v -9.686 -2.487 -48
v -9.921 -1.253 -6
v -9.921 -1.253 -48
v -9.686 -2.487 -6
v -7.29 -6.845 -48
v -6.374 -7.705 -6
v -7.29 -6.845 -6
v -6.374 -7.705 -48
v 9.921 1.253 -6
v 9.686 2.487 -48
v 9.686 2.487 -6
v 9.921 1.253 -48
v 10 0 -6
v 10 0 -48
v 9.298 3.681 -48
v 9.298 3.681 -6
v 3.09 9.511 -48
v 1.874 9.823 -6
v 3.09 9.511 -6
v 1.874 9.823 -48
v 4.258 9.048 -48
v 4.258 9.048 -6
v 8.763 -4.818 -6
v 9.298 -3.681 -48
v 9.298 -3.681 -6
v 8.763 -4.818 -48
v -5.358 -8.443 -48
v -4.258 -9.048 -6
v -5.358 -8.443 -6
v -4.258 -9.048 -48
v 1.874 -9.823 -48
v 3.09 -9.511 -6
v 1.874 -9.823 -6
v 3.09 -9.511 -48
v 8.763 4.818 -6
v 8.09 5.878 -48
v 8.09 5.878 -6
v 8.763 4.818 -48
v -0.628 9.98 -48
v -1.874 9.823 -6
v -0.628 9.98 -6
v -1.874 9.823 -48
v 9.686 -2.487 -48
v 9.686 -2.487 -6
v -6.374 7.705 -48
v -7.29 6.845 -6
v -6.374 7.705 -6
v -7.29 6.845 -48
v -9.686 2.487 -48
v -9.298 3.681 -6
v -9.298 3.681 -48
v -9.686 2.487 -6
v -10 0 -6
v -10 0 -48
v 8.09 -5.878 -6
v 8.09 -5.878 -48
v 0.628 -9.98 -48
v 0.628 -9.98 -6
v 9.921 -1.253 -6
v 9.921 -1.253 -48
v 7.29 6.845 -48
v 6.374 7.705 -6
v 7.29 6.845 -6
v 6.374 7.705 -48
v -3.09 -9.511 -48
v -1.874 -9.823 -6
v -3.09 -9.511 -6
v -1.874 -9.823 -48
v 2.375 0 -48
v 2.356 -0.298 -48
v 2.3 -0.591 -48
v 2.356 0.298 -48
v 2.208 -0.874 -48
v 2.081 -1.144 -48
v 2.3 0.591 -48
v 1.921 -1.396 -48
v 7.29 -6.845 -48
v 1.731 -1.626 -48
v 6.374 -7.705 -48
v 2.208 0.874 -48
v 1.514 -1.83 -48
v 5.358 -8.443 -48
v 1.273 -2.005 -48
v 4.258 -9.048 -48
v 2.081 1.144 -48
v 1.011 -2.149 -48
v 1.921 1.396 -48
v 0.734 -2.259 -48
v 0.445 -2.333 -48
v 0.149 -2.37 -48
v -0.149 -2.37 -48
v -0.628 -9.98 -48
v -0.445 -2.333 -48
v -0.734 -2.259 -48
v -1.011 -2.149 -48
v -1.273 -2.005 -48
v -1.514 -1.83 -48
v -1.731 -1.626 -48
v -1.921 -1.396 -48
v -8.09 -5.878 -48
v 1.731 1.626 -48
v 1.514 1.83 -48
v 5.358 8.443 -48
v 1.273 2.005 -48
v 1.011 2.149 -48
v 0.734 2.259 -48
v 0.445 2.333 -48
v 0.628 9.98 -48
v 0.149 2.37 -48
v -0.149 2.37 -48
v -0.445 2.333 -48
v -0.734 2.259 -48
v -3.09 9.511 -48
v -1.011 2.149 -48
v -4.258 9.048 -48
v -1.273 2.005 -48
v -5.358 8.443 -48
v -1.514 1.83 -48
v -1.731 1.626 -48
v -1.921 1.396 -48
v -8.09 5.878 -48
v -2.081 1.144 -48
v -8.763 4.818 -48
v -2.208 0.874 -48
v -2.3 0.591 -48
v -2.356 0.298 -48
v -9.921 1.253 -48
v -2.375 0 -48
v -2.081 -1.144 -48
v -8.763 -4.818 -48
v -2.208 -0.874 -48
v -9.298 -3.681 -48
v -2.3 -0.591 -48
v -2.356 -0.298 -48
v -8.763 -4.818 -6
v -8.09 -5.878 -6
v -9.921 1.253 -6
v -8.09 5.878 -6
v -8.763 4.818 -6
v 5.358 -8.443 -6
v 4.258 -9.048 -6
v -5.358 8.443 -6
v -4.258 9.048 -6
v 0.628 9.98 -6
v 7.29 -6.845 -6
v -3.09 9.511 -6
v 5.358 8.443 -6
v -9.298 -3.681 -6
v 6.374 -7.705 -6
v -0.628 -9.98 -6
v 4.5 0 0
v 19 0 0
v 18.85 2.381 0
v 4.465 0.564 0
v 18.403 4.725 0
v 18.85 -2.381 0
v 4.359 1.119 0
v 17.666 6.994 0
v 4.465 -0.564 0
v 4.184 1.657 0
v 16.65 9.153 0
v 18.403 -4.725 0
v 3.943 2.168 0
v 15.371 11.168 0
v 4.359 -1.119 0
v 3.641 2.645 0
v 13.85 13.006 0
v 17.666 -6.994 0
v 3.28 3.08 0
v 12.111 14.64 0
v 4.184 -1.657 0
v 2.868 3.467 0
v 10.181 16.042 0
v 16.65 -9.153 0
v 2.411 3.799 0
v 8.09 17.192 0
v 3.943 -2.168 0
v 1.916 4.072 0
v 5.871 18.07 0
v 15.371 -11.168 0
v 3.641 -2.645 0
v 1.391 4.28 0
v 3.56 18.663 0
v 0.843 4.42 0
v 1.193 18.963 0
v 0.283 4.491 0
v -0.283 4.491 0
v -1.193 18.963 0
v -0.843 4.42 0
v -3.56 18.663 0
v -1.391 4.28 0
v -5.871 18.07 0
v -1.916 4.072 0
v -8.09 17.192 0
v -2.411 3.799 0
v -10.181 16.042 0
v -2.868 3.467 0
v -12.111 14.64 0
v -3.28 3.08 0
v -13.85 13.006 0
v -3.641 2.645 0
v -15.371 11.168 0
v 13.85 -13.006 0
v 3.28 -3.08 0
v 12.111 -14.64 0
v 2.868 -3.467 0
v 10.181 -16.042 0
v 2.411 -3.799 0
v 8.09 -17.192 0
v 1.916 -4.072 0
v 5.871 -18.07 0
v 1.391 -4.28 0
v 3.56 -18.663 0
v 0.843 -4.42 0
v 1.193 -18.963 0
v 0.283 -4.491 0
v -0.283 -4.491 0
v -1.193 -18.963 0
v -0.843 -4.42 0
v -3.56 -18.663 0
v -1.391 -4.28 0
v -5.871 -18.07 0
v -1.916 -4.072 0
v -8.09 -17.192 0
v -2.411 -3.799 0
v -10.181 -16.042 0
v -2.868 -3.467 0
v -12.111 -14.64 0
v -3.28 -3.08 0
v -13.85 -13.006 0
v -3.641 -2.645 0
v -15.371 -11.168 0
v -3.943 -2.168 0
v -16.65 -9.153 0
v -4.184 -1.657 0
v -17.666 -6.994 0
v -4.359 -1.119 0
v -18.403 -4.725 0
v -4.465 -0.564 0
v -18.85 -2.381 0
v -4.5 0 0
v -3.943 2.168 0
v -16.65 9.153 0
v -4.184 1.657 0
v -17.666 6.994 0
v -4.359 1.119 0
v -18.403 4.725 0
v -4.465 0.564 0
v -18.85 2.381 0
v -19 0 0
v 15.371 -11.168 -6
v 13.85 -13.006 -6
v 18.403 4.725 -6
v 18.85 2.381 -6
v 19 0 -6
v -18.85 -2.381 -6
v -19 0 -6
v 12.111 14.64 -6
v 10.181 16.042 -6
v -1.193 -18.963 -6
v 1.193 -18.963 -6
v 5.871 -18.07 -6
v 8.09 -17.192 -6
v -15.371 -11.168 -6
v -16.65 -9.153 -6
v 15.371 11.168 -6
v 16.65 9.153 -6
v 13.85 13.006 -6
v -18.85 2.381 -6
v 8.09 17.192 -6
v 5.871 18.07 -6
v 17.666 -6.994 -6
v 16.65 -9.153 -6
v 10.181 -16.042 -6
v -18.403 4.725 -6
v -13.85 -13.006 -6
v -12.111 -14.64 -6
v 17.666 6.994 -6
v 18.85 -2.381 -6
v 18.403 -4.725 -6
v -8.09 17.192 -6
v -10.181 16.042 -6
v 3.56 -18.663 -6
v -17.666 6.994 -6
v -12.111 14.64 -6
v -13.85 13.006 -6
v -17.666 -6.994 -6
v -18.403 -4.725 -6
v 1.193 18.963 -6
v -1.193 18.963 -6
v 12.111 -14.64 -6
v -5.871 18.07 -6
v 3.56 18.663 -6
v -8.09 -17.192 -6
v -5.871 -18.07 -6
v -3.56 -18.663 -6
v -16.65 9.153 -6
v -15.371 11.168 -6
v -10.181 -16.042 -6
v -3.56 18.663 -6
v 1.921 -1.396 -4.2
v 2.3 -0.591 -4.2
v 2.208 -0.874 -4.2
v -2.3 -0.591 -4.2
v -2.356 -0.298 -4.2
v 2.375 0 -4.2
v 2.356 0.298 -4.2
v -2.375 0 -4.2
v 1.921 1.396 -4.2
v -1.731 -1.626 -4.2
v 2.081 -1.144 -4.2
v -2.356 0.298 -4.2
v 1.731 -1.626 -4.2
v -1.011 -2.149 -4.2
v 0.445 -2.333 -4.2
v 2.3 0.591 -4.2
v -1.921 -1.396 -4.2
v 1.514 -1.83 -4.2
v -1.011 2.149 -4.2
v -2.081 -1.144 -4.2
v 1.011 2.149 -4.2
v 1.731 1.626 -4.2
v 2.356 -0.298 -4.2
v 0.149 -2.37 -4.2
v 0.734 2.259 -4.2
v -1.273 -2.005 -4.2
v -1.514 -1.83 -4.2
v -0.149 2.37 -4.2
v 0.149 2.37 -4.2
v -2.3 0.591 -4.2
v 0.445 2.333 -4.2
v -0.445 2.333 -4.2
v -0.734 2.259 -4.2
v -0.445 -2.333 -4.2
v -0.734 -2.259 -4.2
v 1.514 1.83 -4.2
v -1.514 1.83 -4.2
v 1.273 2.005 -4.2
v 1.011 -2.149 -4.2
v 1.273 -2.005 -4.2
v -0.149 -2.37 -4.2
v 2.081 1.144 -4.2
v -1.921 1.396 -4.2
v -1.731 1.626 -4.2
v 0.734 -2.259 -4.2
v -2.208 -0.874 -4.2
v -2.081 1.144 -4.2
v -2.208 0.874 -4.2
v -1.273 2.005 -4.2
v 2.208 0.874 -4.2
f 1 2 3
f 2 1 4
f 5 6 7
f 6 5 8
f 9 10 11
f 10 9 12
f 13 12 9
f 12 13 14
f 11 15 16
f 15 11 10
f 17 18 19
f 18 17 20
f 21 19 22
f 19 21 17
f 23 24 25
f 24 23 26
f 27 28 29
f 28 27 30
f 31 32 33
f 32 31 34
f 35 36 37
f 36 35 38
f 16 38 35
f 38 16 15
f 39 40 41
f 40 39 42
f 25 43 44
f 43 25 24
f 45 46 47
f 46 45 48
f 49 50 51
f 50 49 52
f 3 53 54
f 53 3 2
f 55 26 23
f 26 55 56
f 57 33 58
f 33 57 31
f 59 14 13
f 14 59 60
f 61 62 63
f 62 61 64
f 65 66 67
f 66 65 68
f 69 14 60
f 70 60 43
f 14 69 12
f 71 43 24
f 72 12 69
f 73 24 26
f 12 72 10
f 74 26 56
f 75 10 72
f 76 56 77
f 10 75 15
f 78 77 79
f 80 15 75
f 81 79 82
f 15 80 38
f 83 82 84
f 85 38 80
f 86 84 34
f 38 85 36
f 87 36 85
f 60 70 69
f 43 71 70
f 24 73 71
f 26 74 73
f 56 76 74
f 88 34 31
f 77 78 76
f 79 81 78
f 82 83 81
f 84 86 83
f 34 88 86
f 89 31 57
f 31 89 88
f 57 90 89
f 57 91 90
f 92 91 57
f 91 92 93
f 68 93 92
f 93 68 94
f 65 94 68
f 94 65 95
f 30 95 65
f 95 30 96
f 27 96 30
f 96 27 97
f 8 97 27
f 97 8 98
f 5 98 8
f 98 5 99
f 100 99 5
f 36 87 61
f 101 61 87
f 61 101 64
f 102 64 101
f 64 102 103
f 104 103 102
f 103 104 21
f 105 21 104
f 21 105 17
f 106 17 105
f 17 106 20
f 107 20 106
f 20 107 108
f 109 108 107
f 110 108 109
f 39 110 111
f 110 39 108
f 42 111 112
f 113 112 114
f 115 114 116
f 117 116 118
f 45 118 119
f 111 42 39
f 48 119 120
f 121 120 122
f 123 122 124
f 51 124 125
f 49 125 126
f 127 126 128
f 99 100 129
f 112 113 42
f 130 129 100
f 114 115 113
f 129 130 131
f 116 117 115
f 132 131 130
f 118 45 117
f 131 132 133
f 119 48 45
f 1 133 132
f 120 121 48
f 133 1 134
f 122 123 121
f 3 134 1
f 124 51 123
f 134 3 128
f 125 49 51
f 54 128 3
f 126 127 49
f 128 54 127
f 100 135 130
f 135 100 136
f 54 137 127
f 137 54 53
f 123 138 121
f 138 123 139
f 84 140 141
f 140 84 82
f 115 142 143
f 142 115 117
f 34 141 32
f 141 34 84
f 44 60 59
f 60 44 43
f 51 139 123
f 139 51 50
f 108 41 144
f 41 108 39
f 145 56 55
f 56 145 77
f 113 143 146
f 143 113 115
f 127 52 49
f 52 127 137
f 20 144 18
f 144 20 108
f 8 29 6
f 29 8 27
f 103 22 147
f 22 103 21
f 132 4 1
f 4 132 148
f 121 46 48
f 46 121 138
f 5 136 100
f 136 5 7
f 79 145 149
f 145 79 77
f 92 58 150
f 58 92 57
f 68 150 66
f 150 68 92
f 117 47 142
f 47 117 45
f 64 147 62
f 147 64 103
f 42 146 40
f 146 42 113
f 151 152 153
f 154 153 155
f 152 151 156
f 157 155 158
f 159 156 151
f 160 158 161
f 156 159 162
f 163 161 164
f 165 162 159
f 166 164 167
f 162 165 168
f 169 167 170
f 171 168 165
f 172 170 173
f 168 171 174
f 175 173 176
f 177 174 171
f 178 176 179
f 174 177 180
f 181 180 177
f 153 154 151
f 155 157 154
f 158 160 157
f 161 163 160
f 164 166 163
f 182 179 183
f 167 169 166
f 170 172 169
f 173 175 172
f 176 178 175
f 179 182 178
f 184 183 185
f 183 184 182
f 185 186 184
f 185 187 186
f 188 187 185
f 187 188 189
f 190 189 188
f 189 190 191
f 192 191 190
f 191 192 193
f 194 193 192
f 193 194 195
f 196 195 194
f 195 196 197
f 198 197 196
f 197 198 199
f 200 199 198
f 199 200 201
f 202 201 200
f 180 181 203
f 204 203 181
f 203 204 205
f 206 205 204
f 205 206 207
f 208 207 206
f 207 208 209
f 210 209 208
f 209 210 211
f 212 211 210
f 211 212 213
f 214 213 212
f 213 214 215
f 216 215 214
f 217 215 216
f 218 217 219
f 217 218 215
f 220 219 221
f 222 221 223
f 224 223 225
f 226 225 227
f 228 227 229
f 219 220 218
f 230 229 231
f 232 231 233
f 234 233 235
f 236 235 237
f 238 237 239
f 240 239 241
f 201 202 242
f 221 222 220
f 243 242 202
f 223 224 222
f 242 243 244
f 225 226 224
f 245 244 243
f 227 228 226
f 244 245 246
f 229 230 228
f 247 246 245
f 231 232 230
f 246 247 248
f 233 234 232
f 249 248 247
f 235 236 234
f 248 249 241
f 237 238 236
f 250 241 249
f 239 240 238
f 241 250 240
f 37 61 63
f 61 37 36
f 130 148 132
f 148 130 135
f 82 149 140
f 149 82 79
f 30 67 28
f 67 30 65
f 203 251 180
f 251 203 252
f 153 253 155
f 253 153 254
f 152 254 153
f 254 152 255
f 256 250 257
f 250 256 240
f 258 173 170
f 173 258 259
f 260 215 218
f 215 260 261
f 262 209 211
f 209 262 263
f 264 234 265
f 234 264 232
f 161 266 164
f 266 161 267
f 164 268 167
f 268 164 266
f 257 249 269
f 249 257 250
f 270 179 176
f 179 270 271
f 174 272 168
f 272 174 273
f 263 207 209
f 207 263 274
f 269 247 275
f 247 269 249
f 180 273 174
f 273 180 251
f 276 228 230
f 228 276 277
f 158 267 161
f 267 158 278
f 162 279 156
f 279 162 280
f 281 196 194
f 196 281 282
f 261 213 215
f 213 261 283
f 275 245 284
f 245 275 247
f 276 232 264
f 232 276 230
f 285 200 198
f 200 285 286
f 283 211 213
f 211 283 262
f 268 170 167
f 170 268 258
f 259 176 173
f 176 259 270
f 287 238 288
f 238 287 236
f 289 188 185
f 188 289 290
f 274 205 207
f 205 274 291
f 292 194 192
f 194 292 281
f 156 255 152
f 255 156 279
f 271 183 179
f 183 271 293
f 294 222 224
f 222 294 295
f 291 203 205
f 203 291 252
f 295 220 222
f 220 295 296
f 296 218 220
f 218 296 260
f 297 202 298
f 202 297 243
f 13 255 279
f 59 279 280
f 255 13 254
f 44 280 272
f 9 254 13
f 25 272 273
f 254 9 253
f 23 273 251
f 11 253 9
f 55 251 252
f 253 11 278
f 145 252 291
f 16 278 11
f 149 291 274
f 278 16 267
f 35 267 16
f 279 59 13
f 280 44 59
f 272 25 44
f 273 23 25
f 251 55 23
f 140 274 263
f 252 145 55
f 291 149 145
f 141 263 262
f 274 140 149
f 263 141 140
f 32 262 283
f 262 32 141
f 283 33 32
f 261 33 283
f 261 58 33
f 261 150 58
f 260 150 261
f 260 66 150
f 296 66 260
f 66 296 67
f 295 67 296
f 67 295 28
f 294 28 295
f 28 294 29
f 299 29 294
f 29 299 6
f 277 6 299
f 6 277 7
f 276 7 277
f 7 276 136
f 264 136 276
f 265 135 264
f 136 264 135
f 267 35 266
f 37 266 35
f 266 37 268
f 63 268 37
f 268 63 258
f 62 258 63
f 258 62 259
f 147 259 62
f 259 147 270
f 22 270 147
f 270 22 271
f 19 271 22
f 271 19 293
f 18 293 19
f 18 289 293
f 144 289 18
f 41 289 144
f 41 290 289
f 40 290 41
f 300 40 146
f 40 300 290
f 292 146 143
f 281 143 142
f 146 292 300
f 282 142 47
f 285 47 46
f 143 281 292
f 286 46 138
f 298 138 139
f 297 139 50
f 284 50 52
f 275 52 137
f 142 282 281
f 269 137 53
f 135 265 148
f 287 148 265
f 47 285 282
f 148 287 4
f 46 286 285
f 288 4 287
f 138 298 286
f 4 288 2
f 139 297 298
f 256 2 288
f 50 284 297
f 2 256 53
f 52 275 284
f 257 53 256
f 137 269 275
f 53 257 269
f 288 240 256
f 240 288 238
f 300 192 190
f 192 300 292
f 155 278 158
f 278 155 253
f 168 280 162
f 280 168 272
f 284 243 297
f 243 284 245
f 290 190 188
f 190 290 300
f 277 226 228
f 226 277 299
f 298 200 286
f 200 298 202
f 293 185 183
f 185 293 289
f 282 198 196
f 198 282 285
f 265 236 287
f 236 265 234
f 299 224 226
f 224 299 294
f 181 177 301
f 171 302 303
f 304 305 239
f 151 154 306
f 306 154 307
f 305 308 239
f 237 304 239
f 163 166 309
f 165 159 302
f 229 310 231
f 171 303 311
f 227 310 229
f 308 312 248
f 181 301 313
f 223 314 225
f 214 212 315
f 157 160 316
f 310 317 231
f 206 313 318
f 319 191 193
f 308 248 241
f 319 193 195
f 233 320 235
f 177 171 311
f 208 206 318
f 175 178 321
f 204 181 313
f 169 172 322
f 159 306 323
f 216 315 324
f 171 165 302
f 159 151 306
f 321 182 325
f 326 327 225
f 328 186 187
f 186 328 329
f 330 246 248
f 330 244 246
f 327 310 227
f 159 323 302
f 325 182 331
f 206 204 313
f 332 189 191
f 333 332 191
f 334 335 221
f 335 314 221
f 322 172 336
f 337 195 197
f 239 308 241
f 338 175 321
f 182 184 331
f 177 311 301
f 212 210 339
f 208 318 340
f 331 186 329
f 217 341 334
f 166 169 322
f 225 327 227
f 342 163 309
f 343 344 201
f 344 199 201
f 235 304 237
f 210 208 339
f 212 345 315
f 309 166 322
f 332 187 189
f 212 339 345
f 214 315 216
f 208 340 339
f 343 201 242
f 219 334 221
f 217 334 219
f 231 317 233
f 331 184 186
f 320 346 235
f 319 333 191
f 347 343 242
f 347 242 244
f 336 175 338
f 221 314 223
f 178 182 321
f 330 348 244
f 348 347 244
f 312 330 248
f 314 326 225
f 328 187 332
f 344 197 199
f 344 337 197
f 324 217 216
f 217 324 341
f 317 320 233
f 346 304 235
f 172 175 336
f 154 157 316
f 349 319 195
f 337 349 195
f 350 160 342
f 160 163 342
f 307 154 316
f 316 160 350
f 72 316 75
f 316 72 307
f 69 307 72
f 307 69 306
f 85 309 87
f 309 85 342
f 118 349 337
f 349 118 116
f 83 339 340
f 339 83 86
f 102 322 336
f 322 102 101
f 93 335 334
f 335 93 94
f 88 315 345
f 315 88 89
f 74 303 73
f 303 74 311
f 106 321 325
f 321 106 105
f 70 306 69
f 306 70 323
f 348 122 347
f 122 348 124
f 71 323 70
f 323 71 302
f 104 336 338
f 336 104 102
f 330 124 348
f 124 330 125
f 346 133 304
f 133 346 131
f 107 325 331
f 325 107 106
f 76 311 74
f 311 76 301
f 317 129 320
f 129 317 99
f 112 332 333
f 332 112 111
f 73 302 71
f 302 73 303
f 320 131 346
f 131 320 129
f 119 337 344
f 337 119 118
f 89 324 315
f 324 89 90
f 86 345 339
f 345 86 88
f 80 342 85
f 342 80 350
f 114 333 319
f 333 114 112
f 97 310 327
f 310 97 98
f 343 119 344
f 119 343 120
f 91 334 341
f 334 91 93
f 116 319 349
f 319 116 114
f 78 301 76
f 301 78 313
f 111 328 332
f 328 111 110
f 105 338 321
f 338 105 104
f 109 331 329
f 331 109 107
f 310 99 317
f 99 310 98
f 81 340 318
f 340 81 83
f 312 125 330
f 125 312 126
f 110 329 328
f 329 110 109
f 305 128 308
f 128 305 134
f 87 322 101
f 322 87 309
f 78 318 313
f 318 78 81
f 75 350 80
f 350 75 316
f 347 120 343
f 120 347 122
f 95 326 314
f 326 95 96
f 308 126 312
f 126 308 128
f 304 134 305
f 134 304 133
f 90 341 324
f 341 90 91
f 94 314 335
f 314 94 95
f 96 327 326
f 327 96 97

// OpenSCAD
$fn = 50;


difference() {
	union() {
		translate(v = [0, 0, -48.0000000000]) {
			cylinder(h = 48, r = 10.0000000000);
		}
		translate(v = [0, 0, -6.0000000000]) {
			cylinder(h = 6, r = 19.0000000000);
		}
	}
	union() {
		translate(v = [0, 0, 0]) {
			rotate(a = [0, 0, 0]) {
				difference() {
					union() {
						#translate(v = [0, 0, -48.0000000000]) {
							cylinder(h = 48, r = 2.2500000000);
						}
						#translate(v = [0, 0, -4.2000000000]) {
							cylinder(h = 4.2000000000, r1 = 2.3750000000, r2 = 4.5000000000);
						}
						#translate(v = [0, 0, -48.0000000000]) {
							cylinder(h = 48, r = 2.3750000000);
						}
						#translate(v = [0, 0, -48.0000000000]) {
							cylinder(h = 48, r = 2.2500000000);
						}
					}
					union();
				}
			}
		}
	}
}
